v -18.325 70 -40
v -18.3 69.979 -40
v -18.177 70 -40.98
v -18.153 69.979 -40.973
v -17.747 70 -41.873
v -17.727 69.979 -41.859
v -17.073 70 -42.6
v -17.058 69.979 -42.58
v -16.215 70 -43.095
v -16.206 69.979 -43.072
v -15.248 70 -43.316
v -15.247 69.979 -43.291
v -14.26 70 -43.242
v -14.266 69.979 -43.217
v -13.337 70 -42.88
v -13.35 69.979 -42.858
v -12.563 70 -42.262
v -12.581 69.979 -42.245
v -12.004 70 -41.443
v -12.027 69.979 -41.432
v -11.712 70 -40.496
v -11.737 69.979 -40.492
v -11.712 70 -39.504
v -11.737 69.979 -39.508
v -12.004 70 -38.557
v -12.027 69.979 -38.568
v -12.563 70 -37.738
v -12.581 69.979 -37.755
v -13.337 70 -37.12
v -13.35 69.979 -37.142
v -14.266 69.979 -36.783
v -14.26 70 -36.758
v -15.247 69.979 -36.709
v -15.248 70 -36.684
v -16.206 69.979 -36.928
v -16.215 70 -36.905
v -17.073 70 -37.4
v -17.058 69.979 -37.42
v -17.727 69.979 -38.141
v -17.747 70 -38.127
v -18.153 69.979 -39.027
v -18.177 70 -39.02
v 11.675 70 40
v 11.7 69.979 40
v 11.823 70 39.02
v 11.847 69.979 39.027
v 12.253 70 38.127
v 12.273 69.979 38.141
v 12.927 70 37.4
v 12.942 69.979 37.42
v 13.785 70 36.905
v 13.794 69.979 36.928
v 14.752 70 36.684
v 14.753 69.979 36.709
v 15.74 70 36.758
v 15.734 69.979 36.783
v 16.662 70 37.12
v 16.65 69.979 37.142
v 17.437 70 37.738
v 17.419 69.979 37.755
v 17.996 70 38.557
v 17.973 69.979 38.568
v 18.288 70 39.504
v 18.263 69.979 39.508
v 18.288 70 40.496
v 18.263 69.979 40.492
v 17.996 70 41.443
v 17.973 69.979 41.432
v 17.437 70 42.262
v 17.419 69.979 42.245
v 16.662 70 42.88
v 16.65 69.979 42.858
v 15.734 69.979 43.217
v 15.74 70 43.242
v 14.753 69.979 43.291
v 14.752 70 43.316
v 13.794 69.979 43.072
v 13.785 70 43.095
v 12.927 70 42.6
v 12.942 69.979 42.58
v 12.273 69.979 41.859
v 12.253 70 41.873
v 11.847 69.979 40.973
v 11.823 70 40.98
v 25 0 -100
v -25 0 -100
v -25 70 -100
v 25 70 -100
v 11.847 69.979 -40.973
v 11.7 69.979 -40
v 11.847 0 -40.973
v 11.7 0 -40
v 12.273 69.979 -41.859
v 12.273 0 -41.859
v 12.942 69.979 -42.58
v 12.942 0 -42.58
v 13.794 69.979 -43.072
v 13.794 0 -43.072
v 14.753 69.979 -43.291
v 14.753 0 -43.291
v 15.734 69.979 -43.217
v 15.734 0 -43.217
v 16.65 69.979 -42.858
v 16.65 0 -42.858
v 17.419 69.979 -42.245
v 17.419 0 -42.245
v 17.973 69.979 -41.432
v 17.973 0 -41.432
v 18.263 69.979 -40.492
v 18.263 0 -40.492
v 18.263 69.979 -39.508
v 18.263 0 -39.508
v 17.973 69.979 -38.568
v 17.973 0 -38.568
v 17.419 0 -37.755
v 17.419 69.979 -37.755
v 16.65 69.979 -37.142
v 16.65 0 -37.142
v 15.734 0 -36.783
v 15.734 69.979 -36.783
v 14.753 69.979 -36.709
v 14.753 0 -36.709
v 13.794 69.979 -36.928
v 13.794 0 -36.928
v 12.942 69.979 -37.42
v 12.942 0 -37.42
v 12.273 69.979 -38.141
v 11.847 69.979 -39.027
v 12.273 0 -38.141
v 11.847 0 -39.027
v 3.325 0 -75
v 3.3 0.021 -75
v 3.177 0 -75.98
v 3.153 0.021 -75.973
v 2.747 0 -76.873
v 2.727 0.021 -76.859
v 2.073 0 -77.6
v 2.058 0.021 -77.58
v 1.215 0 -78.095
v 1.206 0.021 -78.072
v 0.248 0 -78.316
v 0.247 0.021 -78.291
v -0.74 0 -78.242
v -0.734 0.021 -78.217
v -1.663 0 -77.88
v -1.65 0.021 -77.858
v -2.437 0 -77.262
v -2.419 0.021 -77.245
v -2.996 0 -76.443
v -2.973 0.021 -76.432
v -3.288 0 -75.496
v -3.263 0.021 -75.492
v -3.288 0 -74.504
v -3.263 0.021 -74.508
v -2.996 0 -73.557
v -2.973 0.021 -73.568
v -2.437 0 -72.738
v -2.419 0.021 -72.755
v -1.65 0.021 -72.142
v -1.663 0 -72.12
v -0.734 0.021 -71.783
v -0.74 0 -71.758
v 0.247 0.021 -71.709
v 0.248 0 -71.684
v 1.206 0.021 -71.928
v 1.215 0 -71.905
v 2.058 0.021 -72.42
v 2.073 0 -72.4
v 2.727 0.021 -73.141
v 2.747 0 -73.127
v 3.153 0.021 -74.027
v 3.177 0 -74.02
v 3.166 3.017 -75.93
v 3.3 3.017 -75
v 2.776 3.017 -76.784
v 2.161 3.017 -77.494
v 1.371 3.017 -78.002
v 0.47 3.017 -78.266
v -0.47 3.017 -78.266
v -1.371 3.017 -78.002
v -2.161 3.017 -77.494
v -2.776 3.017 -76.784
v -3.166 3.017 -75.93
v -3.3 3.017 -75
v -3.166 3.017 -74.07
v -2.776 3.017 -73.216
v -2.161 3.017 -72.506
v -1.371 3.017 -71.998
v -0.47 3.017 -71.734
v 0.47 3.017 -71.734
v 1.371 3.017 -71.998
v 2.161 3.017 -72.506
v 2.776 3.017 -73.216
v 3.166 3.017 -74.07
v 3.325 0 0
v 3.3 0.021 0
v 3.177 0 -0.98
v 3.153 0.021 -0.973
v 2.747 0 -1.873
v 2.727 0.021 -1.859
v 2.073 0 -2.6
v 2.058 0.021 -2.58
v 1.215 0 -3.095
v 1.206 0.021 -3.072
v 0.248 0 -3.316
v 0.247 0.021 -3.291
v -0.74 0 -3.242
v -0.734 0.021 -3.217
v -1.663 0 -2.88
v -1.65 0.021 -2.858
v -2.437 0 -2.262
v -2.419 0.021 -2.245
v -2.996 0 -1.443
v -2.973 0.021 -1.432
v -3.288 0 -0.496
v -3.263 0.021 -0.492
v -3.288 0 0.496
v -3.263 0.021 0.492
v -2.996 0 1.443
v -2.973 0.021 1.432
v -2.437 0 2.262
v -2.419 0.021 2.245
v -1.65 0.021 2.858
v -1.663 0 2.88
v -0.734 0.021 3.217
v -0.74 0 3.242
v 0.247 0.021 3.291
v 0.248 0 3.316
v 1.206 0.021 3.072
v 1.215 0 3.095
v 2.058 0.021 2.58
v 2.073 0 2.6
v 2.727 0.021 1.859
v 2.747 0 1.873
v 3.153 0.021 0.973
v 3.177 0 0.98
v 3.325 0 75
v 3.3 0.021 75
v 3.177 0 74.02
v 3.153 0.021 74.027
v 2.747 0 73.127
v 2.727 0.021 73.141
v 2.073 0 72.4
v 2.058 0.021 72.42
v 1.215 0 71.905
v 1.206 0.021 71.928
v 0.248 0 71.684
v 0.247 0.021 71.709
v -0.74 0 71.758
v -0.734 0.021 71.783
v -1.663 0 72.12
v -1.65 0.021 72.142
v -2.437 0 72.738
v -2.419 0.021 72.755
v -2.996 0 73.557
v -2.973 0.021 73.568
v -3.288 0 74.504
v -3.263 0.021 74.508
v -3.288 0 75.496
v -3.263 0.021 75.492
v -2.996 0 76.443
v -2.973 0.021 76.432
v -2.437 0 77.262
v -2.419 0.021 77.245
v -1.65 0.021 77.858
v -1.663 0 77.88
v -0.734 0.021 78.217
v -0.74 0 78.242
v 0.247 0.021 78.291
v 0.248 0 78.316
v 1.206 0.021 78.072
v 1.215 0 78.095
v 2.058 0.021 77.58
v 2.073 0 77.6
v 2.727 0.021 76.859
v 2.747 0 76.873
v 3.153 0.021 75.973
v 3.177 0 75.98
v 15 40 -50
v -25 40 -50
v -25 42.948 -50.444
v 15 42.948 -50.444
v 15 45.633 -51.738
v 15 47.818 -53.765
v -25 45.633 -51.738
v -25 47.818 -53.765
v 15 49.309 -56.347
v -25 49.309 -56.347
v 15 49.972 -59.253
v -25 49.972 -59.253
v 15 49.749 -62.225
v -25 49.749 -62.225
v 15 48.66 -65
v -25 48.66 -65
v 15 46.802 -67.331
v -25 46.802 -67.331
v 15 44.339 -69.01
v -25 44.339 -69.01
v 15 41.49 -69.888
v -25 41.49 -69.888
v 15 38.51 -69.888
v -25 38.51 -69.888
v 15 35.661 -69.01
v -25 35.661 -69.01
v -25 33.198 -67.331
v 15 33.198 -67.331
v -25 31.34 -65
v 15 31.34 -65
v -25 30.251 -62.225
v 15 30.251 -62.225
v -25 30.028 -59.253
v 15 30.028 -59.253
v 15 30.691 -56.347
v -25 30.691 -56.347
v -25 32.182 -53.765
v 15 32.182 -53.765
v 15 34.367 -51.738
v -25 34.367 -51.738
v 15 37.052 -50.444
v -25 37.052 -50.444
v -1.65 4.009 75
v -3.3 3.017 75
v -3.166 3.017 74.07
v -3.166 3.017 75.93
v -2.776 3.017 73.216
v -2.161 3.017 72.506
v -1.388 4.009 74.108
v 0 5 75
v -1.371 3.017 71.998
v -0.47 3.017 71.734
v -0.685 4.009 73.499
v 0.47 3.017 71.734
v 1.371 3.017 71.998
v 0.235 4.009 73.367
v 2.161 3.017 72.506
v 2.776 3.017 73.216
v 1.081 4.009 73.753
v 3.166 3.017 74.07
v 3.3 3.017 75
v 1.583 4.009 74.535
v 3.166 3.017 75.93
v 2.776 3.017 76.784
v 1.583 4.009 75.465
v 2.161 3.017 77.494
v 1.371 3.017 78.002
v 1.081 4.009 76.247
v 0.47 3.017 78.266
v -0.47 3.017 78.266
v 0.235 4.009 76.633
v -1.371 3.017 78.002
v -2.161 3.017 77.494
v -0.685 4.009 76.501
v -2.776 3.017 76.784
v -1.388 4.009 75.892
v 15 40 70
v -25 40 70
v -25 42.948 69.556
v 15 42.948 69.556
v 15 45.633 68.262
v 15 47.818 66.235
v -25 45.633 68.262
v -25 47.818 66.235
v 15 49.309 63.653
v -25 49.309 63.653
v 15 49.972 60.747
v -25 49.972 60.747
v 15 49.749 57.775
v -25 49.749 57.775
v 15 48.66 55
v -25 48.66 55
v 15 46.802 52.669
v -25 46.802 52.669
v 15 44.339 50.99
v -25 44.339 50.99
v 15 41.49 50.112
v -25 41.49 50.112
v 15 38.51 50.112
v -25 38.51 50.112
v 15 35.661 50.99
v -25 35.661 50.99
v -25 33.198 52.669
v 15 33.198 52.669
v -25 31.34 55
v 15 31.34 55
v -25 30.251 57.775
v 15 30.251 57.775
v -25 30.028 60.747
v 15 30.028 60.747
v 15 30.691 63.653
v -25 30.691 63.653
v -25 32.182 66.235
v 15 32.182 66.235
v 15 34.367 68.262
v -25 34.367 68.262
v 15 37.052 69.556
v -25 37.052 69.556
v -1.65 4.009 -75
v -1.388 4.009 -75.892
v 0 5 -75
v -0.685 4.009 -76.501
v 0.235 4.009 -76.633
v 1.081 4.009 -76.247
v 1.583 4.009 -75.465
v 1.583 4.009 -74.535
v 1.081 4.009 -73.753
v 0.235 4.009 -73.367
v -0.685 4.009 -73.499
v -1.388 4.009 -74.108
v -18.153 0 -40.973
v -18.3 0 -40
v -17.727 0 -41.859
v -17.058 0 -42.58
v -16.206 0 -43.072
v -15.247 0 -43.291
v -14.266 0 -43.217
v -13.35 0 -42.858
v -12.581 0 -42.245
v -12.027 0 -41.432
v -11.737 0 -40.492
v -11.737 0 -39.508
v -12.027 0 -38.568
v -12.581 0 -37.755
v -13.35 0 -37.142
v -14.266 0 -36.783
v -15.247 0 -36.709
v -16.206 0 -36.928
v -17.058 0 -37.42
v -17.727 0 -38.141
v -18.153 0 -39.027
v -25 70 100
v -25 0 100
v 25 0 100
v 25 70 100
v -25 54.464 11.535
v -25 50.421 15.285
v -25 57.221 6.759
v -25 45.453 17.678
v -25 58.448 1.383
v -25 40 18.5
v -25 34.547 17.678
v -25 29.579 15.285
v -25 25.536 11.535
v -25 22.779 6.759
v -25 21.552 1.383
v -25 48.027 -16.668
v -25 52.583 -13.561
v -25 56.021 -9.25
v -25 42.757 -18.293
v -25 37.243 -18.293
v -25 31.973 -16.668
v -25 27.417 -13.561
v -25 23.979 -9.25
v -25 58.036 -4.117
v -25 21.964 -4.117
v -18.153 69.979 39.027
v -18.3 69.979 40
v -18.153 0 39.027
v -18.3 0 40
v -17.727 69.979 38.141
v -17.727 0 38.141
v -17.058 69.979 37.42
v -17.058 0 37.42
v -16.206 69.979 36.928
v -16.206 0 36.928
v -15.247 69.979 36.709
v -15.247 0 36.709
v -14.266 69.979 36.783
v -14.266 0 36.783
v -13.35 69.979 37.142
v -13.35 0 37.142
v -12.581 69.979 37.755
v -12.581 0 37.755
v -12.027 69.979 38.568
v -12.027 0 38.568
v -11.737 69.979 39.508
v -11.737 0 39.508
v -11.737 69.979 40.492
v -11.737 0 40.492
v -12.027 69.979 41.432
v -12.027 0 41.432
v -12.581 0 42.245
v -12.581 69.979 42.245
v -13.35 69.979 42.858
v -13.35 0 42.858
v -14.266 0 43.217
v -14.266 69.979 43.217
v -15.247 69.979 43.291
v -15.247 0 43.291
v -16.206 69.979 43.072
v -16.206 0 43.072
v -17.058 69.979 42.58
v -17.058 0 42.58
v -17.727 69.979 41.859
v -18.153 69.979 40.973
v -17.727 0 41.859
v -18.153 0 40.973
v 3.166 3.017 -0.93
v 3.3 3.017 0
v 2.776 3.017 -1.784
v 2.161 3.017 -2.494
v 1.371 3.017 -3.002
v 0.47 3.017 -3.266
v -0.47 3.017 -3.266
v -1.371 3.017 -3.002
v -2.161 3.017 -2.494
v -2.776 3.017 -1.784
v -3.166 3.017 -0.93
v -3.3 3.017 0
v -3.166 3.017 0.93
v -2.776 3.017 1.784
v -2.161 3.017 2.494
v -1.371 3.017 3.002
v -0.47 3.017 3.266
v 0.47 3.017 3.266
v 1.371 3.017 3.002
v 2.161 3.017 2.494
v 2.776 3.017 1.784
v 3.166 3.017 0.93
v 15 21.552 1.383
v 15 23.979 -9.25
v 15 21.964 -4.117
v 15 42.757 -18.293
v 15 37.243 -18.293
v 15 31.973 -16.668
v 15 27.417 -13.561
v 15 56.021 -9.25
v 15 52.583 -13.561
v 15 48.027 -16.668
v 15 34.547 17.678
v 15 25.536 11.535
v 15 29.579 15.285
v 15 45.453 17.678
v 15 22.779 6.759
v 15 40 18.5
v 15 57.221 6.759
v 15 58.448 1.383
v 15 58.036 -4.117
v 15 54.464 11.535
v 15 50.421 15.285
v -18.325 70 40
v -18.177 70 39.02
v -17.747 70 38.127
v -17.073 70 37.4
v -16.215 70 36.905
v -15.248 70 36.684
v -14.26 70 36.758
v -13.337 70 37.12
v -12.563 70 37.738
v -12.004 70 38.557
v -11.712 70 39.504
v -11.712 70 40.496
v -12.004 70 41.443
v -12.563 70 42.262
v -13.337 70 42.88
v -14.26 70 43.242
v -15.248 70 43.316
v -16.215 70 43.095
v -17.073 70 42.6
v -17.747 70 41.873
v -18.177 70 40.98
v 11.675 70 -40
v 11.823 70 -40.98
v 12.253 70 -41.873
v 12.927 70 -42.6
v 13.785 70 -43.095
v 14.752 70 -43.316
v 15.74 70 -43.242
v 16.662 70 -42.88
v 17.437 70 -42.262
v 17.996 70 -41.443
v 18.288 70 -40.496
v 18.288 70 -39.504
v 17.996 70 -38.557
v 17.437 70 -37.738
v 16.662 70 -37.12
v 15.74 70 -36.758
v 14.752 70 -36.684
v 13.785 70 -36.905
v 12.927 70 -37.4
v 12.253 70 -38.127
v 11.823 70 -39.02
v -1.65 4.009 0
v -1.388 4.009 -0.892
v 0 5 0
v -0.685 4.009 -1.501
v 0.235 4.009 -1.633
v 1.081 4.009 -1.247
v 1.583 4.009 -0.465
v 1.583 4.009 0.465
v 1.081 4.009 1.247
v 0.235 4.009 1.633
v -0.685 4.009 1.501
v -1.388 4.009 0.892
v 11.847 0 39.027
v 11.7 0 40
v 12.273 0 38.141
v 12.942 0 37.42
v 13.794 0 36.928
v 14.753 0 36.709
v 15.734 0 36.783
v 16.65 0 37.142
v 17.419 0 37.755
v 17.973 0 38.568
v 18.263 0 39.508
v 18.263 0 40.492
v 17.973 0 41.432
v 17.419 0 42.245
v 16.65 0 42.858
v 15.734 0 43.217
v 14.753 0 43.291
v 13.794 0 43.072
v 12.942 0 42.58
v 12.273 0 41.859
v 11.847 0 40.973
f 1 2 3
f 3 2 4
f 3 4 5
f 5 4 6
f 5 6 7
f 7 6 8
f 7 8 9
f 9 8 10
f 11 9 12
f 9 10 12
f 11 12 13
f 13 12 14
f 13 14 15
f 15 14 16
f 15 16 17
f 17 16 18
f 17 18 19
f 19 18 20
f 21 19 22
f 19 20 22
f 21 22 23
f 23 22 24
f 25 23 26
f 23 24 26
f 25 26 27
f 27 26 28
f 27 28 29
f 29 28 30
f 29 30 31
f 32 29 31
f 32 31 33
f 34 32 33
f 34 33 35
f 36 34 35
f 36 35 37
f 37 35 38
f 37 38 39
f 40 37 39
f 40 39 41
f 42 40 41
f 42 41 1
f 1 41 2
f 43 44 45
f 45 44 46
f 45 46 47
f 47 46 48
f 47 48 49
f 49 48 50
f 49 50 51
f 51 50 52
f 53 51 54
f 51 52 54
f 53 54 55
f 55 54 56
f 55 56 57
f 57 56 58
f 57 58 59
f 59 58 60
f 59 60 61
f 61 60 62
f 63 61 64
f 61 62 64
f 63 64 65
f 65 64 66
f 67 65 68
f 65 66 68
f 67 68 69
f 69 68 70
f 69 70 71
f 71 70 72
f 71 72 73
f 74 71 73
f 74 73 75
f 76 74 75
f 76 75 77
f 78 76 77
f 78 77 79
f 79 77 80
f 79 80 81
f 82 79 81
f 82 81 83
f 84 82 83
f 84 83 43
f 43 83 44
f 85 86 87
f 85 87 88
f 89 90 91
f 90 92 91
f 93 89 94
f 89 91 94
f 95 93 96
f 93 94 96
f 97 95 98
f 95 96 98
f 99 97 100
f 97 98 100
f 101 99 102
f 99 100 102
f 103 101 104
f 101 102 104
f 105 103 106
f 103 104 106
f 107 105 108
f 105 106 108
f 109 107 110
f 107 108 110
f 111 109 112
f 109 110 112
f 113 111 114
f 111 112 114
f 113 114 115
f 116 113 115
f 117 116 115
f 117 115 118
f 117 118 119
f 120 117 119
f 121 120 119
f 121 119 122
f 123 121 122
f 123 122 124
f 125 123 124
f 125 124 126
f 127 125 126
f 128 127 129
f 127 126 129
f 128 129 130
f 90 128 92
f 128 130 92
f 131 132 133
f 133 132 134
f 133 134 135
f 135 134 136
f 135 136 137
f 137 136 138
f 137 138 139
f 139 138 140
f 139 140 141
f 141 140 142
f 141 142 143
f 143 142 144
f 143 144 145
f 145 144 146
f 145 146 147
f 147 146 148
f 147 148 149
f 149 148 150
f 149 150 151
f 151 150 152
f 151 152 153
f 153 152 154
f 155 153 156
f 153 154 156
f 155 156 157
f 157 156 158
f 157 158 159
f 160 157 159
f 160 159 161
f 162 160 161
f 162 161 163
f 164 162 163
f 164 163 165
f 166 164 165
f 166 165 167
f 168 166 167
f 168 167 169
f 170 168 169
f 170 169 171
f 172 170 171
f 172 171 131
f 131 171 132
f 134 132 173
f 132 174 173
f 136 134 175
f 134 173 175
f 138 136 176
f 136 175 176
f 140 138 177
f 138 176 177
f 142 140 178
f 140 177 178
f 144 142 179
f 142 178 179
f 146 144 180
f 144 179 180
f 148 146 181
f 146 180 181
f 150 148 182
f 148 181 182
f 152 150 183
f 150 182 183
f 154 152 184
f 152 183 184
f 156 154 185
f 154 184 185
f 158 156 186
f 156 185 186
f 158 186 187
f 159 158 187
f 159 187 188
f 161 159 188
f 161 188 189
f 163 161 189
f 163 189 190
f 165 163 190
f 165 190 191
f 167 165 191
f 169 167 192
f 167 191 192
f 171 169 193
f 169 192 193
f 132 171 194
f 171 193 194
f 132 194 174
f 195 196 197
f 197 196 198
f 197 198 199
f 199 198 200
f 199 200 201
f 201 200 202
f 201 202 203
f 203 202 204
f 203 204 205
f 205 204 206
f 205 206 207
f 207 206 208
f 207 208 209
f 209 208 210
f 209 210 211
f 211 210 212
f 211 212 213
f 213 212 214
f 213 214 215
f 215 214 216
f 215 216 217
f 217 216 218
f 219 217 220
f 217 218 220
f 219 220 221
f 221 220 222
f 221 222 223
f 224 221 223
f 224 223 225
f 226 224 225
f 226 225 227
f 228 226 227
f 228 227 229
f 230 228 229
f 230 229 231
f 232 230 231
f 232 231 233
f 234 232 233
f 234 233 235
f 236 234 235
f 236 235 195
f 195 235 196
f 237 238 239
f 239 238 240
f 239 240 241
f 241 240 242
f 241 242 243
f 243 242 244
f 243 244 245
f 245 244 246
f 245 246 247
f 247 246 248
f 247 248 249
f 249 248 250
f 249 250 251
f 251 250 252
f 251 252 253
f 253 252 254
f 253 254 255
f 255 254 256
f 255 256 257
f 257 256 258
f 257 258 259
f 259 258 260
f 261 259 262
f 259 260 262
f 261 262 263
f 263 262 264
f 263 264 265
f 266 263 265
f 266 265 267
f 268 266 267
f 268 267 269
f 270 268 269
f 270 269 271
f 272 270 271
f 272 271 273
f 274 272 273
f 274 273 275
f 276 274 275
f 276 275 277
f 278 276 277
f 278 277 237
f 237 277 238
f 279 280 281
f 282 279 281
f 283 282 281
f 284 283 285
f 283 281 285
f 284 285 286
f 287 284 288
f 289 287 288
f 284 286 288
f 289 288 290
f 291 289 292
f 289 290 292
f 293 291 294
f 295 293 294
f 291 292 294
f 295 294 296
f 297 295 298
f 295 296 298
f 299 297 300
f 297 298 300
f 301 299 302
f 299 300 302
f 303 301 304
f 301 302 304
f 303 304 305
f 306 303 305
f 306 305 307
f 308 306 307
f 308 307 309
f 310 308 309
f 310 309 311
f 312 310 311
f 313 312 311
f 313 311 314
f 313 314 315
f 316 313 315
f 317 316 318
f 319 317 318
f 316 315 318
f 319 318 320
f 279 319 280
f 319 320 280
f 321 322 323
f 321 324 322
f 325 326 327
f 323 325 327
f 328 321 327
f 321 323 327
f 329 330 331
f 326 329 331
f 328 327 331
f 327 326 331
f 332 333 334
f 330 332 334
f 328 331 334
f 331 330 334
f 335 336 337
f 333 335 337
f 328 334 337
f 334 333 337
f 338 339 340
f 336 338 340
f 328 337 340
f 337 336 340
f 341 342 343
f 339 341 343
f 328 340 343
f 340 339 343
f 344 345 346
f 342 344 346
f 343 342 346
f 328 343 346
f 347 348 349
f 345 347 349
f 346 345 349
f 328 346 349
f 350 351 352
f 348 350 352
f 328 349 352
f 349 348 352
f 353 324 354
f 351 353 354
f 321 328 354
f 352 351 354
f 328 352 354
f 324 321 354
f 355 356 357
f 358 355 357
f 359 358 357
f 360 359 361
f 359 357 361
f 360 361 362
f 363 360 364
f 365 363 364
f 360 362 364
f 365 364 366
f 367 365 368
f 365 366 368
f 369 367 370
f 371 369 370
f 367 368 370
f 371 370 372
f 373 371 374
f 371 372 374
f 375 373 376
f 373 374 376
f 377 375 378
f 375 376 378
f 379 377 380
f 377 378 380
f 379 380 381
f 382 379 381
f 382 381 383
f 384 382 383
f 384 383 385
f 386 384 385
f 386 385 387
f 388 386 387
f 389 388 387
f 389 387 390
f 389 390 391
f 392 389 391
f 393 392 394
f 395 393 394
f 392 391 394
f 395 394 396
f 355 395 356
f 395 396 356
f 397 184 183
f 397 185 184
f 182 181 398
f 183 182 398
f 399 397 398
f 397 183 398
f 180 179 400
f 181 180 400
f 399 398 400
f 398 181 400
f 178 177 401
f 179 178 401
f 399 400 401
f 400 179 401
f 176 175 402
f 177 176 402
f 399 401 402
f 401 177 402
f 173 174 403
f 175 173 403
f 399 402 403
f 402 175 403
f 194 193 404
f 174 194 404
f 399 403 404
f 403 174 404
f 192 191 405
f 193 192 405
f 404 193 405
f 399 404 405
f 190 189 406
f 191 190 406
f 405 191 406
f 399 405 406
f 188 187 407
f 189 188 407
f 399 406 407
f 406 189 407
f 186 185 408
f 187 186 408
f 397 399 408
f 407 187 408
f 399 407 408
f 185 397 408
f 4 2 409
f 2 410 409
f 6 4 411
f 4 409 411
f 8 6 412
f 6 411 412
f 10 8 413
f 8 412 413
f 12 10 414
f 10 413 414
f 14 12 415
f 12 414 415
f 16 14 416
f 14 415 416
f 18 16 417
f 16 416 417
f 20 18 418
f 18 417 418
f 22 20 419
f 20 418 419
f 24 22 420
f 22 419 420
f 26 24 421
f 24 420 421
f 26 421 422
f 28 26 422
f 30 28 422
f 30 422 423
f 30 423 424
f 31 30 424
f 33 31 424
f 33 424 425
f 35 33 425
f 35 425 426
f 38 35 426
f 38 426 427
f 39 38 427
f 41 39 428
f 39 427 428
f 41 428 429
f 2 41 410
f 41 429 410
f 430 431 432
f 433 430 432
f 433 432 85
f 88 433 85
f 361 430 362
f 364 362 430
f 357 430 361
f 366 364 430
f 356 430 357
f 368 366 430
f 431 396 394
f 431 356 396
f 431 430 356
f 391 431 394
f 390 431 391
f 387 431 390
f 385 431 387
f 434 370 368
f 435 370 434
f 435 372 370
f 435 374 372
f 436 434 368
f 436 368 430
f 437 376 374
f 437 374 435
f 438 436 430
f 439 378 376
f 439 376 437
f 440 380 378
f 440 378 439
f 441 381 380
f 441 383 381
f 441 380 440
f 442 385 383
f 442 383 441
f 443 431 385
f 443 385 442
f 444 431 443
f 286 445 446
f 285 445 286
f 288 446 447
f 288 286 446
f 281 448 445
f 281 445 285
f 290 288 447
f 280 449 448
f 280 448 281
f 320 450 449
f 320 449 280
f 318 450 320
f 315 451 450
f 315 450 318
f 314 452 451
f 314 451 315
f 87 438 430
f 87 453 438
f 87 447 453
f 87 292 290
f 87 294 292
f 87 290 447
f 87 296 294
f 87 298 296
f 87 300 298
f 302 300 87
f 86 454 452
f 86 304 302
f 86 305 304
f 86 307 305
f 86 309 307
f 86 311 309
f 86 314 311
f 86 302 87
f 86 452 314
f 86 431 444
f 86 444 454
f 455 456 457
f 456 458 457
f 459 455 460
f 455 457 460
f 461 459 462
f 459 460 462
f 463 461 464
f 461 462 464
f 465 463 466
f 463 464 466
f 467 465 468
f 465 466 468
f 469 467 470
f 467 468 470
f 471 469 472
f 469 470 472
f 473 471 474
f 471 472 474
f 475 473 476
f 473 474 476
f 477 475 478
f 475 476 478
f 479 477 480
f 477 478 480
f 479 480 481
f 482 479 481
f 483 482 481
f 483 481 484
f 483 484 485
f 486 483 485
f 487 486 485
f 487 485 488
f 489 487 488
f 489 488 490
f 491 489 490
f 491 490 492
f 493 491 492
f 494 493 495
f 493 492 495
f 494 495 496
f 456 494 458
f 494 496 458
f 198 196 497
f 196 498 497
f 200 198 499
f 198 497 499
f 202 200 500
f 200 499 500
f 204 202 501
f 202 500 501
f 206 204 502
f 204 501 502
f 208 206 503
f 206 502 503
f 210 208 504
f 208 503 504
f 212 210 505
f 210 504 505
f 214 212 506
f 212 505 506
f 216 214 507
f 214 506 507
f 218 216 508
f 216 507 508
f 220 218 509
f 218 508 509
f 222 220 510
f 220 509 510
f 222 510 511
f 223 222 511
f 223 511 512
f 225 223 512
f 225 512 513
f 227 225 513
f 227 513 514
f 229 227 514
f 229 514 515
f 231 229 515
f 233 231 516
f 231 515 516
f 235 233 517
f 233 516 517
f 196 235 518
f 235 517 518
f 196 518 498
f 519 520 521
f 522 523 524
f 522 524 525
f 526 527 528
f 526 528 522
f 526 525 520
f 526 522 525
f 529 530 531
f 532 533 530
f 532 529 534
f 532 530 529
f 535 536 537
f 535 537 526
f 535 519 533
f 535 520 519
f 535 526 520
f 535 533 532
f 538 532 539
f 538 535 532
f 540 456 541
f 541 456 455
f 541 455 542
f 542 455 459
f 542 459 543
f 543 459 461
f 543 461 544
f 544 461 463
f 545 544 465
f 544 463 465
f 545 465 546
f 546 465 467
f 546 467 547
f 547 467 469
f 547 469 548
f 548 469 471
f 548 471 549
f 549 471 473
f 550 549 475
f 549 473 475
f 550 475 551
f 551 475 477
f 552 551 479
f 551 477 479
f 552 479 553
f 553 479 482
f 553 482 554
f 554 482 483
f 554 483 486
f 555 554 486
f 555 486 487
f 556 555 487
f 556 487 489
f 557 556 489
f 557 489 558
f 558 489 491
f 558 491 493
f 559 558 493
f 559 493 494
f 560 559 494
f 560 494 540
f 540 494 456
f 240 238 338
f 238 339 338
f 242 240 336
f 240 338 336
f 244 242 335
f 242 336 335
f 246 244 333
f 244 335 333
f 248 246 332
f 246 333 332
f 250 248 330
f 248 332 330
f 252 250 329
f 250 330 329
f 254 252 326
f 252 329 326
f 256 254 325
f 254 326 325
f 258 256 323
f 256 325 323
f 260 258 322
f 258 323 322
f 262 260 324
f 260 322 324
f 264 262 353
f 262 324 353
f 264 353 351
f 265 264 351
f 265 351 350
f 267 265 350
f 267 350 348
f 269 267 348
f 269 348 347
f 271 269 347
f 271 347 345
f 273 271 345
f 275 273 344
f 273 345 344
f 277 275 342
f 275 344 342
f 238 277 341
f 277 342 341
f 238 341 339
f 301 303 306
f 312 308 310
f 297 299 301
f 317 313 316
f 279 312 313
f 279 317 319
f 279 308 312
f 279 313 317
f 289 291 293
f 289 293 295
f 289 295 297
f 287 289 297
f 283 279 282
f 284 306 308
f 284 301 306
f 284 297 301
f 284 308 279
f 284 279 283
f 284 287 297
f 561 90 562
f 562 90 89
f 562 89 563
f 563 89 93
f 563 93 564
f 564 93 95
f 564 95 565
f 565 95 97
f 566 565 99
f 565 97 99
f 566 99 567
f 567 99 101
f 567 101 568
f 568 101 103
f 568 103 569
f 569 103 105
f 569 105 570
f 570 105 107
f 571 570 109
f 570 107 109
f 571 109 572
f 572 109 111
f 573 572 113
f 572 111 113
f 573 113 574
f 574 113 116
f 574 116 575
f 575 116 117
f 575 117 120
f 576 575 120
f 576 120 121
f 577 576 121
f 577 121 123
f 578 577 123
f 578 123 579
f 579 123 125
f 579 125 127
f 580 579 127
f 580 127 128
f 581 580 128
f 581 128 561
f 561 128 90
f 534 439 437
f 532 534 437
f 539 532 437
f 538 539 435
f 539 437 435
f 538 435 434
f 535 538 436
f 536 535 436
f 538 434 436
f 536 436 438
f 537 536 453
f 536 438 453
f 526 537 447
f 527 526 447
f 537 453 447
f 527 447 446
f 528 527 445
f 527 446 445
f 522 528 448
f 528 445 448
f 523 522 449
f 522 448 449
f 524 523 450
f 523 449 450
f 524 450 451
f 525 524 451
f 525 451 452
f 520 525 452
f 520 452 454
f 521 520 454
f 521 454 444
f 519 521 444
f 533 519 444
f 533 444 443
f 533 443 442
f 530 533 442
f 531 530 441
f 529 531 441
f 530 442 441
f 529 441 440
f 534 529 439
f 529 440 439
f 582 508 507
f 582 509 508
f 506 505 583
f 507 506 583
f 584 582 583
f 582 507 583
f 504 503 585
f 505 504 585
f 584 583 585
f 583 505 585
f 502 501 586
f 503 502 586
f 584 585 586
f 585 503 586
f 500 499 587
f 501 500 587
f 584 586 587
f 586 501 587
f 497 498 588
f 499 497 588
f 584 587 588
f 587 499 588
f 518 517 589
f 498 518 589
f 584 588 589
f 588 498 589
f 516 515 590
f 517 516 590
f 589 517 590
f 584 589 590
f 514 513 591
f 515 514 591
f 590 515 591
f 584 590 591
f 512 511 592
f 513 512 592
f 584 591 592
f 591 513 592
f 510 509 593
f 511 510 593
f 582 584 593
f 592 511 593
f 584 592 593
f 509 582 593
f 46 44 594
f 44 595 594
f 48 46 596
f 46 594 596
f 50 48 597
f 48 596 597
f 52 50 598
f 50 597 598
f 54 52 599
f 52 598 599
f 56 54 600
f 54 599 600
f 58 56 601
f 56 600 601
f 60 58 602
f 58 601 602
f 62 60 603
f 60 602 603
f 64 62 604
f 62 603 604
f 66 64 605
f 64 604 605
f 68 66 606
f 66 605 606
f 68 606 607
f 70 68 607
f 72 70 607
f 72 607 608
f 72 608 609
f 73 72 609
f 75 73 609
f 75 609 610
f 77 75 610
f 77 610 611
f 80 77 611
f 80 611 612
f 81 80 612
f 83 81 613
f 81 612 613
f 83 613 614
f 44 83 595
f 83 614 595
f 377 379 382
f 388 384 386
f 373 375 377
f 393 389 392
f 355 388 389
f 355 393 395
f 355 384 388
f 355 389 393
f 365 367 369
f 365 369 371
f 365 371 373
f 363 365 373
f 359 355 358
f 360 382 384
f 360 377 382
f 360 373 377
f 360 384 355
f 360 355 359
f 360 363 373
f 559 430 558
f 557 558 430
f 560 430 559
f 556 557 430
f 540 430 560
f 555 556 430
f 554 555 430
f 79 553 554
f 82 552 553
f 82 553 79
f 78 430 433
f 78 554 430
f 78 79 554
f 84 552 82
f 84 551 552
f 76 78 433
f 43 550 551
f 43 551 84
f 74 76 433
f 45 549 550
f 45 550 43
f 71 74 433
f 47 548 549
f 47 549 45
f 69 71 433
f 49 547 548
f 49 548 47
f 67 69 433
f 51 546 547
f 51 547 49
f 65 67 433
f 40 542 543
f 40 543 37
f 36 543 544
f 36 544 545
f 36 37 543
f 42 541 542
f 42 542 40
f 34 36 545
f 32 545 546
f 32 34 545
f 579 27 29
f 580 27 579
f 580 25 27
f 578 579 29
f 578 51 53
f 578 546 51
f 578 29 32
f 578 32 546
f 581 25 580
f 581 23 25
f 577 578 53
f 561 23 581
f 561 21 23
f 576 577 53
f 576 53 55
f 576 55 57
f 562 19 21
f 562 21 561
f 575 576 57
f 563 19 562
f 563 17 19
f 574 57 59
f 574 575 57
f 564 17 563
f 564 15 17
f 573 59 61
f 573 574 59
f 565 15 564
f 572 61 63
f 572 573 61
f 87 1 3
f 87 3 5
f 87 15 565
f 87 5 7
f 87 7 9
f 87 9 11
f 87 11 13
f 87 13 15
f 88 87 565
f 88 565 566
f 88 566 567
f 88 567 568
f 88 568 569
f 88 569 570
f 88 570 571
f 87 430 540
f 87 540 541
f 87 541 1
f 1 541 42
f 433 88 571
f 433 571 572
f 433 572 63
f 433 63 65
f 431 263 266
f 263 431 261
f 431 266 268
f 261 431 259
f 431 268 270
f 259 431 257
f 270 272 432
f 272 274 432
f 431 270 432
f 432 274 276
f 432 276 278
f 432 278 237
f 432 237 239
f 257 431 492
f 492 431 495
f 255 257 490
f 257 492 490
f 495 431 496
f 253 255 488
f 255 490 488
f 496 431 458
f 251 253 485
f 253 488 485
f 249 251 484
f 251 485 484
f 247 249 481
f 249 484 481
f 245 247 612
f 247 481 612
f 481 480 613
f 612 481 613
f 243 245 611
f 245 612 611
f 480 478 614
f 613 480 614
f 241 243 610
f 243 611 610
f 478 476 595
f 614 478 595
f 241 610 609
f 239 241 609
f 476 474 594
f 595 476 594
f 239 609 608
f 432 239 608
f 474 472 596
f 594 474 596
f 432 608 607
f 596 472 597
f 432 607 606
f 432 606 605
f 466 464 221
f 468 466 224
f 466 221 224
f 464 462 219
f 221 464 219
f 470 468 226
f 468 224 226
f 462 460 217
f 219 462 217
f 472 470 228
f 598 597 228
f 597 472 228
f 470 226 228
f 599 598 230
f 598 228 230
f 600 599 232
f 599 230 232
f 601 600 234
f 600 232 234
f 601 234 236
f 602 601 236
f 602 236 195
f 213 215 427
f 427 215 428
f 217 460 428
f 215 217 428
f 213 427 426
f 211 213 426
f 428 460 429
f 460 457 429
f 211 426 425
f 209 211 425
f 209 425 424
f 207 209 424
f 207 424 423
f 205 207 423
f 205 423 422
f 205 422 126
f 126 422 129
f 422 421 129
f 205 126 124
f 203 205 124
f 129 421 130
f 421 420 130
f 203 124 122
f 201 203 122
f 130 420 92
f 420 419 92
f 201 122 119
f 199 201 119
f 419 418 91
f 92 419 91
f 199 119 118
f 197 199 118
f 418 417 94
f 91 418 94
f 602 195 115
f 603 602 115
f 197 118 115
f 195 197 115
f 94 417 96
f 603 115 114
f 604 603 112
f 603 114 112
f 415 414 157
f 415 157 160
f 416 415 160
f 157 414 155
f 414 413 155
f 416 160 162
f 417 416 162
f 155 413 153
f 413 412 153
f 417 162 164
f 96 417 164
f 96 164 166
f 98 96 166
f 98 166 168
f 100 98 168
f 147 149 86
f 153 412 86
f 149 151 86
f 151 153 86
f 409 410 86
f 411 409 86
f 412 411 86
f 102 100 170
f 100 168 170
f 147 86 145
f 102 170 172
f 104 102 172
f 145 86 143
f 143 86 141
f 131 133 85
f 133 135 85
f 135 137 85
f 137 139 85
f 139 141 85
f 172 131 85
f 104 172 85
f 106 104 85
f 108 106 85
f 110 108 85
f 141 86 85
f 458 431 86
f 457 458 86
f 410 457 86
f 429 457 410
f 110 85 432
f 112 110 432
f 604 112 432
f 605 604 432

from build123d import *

# Parameters (mm, degrees)
SKETCH1_W                      = 50
SKETCH1_H                      = 200
BOSS_EXTRUDE1_DEPTH            = 70
M6_CLEARANCE_HOLE1_D           = 6.6
M6_CLEARANCE_HOLE1_DEPTH       = 3.017159957
M6_CLEARANCE_HOLE1_CSINK_D     = 6.65
M6_CLEARANCE_HOLE1_CSINK_ANGLE = 100
M6_CLEARANCE_HOLE1_TIP         = 1.982840043
SKETCH5_R                      = 10
SKETCH5_R_2                    = 18.5
CUT_EXTRUDE1_DEPTH             = 40
M6_CLEARANCE_HOLE2_D           = 6.6
M6_CLEARANCE_HOLE2_CSINK_D     = 6.65
M6_CLEARANCE_HOLE2_CSINK_ANGLE = 100


with BuildPart() as part:
    # Sketch1 → Boss-Extrude1 (new body)
    with BuildSketch(Plane(origin=(0, 0, 0), x_dir=(1, 0, 0), z_dir=(0, 1, 0))):
        Rectangle(SKETCH1_W, SKETCH1_H)
    extrude(amount=BOSS_EXTRUDE1_DEPTH)

    # M6 Clearance Hole1
    with Locations(Plane(origin=(0, 0, 0), x_dir=(-1, 0, 0), z_dir=(0, -1, 0))):
        with Locations((0, 75), (0, 0), (0, -75)):
            CounterSinkHole(M6_CLEARANCE_HOLE1_D / 2, M6_CLEARANCE_HOLE1_CSINK_D / 2, depth=M6_CLEARANCE_HOLE1_DEPTH, counter_sink_angle=M6_CLEARANCE_HOLE1_CSINK_ANGLE)
            with Locations((0, 0, -(M6_CLEARANCE_HOLE1_DEPTH + M6_CLEARANCE_HOLE1_TIP / 2))):  # 118° drill point
                Cone(0, M6_CLEARANCE_HOLE1_D / 2, M6_CLEARANCE_HOLE1_TIP, mode=Mode.SUBTRACT)

    # Sketch5 → Cut-Extrude1 (cut)
    with BuildSketch(Plane.ZY.offset(25)):
        with Locations((-60, 40)):
            Circle(SKETCH5_R)
        with Locations((60, 40)):
            Circle(SKETCH5_R)
        with Locations((0, 40)):
            Circle(SKETCH5_R_2)
    extrude(amount=-CUT_EXTRUDE1_DEPTH, mode=Mode.SUBTRACT)

    # M6 Clearance Hole2 (through all)
    with Locations(Plane(origin=(0, 70, 0), x_dir=(1, 0, 0), z_dir=(0, 1, 0))):
        with Locations((-15, 40), (15, 40), (-15, -40), (15, -40)):
            CounterSinkHole(M6_CLEARANCE_HOLE2_D / 2, M6_CLEARANCE_HOLE2_CSINK_D / 2, counter_sink_angle=M6_CLEARANCE_HOLE2_CSINK_ANGLE)


solid = part.part
